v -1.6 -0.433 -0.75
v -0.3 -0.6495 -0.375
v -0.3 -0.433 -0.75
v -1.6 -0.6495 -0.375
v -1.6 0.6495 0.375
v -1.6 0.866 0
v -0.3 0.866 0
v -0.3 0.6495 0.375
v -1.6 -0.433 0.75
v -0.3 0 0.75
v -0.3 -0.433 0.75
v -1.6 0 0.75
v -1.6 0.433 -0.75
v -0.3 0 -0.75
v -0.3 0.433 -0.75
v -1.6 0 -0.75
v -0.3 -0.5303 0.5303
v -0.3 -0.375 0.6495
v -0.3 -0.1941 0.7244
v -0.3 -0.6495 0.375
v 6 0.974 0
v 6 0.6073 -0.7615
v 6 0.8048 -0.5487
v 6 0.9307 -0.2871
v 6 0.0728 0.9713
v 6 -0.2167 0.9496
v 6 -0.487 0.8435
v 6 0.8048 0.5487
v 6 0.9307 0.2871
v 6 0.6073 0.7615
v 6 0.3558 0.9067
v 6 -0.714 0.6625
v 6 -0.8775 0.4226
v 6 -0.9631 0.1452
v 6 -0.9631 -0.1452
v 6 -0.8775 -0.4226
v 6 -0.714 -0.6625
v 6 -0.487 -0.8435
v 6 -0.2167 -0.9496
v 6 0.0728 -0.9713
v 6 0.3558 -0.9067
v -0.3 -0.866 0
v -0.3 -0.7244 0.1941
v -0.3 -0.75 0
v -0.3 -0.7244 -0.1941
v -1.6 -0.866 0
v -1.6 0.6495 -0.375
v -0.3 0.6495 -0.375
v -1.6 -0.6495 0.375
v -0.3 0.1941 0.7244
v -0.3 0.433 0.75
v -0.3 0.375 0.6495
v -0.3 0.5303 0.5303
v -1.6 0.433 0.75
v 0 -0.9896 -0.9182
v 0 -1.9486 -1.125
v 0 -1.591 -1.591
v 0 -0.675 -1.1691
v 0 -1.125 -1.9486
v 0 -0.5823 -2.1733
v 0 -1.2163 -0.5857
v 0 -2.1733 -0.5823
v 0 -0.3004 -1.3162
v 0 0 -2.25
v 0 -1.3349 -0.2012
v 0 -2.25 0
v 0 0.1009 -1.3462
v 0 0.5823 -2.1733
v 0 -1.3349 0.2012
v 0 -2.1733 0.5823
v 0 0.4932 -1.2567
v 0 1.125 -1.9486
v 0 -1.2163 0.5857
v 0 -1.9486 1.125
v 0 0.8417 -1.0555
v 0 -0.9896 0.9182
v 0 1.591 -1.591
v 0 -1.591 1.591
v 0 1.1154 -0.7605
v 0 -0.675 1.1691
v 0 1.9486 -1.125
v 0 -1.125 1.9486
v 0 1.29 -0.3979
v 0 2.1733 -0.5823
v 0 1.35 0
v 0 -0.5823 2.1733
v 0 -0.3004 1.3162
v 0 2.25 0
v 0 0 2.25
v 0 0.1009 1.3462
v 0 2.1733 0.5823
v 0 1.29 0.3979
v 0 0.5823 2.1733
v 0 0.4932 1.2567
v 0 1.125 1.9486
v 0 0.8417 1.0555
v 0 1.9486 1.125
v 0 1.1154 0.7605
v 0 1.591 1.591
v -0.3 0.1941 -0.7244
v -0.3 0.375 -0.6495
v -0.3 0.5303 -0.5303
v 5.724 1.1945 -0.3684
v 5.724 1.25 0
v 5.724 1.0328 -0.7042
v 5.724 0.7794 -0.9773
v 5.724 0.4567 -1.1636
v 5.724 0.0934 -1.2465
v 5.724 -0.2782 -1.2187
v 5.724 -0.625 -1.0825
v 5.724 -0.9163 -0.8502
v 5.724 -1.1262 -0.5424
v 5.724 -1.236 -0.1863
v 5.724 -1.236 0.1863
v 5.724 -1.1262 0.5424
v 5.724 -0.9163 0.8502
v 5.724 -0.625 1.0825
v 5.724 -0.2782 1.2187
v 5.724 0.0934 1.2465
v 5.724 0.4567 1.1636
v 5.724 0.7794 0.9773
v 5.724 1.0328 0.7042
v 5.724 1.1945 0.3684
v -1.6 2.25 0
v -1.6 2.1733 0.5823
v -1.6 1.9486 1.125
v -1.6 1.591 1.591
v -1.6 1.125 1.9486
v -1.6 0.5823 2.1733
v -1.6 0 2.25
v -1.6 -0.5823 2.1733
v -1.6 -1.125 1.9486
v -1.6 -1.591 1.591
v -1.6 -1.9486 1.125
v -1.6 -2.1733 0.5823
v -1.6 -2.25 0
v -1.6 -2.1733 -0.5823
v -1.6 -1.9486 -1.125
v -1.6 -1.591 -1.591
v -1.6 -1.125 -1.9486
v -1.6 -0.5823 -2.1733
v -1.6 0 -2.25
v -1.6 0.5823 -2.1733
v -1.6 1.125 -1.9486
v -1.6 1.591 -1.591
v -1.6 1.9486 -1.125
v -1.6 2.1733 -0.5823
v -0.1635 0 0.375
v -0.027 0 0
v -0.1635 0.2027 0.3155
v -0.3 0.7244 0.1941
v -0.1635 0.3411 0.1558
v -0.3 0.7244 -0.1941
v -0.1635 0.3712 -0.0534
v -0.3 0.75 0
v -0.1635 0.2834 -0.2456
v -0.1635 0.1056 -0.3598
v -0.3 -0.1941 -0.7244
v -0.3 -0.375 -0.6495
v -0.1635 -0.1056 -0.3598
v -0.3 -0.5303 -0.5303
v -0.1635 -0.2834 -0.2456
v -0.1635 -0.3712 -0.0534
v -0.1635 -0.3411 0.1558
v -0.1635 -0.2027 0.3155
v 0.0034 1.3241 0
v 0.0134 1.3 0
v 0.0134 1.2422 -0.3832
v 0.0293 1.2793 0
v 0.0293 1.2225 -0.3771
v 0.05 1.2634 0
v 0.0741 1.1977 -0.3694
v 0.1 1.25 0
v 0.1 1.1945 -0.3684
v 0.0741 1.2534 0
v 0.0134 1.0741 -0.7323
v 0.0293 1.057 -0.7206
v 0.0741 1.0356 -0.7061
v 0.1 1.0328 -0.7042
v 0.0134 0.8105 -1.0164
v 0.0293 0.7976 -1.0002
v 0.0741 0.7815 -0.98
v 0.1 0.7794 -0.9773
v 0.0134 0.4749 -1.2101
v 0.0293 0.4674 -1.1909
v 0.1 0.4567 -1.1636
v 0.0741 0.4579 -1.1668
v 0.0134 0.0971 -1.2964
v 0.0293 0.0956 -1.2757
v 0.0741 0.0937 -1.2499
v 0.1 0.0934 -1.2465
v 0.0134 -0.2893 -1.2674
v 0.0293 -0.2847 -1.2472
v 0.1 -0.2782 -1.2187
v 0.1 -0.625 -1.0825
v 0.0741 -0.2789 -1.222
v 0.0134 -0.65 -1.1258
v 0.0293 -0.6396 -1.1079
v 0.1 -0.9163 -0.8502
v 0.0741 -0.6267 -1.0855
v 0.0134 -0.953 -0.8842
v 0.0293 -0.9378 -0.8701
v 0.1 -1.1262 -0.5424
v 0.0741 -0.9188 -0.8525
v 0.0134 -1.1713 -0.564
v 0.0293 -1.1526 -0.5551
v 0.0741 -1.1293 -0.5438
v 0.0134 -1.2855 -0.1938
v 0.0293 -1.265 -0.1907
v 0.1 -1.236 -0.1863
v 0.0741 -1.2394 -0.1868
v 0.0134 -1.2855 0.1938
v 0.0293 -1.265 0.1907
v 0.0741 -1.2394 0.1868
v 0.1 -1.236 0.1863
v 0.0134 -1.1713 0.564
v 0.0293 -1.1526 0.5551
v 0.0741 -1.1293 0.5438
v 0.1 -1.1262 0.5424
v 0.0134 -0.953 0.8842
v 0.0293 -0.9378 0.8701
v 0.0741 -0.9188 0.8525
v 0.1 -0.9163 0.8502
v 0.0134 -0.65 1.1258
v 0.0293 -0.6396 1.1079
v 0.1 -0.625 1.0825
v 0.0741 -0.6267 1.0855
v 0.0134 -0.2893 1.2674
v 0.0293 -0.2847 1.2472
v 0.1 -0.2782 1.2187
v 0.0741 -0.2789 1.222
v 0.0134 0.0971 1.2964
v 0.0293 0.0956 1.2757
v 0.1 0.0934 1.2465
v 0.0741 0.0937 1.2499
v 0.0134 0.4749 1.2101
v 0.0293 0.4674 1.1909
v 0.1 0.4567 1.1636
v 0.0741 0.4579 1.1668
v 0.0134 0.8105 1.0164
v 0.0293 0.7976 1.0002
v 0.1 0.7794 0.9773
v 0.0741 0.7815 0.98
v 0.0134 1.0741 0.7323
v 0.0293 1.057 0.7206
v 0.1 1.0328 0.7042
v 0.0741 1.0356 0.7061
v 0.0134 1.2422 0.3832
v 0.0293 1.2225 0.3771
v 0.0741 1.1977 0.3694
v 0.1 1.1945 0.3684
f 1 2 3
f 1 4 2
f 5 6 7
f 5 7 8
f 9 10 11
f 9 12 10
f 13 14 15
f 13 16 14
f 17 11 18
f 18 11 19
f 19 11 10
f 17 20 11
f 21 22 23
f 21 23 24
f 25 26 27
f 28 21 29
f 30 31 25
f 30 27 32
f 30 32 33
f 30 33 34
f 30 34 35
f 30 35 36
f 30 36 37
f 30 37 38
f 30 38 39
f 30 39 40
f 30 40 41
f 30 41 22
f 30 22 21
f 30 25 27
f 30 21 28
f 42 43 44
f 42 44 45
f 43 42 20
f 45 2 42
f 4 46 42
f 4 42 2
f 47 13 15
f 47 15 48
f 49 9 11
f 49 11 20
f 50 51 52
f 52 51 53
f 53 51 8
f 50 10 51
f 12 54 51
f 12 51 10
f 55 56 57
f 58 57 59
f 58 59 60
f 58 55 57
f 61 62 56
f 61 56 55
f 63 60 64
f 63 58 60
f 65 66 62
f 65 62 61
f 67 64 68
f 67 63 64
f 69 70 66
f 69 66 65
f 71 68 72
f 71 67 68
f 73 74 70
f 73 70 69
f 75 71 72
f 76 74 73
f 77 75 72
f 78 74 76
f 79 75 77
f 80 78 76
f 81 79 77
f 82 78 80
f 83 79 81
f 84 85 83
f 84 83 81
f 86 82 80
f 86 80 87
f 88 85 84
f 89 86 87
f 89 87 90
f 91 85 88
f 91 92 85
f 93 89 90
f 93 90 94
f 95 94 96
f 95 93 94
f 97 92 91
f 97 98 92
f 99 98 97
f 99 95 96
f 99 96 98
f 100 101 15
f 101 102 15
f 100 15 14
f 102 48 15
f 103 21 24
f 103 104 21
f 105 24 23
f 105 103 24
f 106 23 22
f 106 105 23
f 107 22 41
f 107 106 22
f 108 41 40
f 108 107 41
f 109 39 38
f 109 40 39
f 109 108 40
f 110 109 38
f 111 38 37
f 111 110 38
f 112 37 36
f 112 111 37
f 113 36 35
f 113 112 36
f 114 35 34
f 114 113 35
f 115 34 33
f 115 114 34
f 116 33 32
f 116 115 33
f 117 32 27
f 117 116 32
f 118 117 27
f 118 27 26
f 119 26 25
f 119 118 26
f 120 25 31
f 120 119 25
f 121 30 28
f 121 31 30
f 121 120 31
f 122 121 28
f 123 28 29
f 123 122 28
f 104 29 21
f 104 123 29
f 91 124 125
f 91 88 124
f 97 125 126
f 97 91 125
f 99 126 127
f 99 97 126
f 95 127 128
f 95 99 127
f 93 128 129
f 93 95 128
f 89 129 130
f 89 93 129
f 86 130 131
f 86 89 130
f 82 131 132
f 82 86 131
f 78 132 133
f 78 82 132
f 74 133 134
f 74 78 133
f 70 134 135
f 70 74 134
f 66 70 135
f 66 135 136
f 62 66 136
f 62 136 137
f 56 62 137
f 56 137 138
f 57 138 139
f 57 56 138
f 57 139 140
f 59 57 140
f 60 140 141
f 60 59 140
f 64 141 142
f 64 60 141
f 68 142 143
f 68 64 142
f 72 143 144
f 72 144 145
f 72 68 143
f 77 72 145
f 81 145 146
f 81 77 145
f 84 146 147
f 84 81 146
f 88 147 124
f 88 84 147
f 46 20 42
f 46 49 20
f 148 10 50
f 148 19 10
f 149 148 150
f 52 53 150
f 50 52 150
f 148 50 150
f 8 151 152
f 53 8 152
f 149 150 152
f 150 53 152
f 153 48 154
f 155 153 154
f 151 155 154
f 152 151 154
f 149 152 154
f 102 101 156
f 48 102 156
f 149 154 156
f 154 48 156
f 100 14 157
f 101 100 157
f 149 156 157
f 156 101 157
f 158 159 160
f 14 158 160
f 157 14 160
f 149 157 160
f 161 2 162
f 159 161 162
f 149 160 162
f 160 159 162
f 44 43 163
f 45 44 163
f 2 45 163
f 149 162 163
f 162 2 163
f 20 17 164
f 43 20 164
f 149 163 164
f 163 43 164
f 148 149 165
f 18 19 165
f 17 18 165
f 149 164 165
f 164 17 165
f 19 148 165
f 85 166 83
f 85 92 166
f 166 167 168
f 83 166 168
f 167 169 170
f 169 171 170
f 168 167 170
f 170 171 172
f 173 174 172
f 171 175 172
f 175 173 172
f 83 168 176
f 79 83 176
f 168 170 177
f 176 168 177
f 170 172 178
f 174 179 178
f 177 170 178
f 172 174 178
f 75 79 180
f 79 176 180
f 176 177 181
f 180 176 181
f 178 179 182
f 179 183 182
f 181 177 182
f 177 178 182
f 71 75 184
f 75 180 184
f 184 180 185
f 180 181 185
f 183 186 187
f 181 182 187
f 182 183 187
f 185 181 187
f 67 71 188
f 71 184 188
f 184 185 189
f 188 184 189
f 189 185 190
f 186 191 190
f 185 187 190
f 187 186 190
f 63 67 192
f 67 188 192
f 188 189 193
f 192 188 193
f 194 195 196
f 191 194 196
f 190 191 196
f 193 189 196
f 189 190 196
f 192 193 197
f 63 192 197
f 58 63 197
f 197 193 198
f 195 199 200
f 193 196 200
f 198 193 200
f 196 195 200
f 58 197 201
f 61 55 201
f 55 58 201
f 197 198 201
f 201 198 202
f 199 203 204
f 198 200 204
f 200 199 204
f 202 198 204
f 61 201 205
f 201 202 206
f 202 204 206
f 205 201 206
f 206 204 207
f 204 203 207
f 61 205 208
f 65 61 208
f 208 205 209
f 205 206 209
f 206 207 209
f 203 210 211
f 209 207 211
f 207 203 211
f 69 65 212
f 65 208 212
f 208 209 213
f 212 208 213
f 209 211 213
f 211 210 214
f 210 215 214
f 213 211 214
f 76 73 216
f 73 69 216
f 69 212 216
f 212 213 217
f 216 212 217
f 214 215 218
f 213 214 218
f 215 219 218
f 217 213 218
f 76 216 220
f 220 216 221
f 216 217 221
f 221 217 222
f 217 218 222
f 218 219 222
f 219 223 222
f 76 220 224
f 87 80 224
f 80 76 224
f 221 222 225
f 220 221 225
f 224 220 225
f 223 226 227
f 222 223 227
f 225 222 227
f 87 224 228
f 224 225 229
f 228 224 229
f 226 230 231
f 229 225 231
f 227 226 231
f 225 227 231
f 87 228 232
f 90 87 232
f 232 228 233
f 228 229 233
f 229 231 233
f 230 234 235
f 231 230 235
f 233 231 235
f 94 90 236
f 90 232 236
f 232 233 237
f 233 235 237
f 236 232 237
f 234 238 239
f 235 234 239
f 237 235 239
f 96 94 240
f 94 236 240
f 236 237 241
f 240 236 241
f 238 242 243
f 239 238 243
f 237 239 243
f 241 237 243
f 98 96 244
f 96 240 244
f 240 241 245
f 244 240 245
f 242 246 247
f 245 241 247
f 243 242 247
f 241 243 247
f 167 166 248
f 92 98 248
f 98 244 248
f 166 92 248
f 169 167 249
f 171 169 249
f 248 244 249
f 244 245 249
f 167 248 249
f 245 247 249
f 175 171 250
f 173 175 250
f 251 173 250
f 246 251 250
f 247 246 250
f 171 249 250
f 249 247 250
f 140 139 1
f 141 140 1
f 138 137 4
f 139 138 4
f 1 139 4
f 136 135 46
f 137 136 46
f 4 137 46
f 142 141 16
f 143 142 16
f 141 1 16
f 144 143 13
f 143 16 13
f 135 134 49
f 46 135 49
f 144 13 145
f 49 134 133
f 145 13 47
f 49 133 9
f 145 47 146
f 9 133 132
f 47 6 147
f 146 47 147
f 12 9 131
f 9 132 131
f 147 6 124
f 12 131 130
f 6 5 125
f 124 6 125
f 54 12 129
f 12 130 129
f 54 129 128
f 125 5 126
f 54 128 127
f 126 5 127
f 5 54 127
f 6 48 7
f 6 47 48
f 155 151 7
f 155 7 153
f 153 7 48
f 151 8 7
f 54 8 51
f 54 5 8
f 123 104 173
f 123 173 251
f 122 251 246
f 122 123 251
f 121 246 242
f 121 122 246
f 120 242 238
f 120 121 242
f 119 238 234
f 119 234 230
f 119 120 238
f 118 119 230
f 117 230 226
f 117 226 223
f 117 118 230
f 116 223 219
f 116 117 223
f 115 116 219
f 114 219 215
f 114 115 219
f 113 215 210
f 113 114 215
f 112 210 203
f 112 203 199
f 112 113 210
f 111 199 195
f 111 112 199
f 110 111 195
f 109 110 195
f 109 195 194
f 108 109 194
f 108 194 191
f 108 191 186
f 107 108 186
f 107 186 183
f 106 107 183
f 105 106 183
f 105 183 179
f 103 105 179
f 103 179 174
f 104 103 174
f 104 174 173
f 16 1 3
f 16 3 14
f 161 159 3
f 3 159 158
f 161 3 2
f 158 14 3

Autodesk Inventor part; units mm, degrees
sketch "Sketch_1" plane through (0, 0, 0) normal (0, 0, 1) x (1, 0, 0)
  line L0 (6, 0) -> (-1.6, 0)
  line L1 (-1.6, 0) -> (-1.6, 2.25)
  line L2 (-1.6, 2.25) -> (0, 2.25)
  line L3 (0, 2.25) -> (0, 1.35)
  arc A0 (0, 1.35) -> (0.1, 1.25) centre (0.1, 1.35) ccw
  line L4 (0.1, 1.25) -> (5.724, 1.25)
  line L5 (5.724, 1.25) -> (6, 0.974)
  line L6 (6, 0.974) -> (6, 0)
  line L7 (6, 0) -> (-1.6, 0)
revolve "Revolution1" add sketch "Sketch_1" angle 360 about axis through (6, 0, 0) along (1, 0, 0)
thread "Thread1" size "M2.5x0.45" class "6g" standard "ISO Metric profile" length 5.274
sketch "Sketch2" plane through (-1.6, 0, 0) normal (-1, 0, 0) x (0, 0, 1)
  point P0 (0, 0)
hole "Hole1" at (-1.6, 0, 0) direction (1, 0, 0) diameter 1.5 depth 1.3 tip angle 140
sketch "Sketch_3" plane through (-1.6, 0, 0) normal (1, 0, 0) x (0, 0, -1)
  line L0 (-0.75, -0.433) -> (0, -0.866)
  line L1 (0, -0.866) -> (0.75, -0.433)
  line L2 (0.75, -0.433) -> (0.75, 0.433)
  line L3 (0.75, 0.433) -> (0, 0.866)
  line L4 (0, 0.866) -> (-0.75, 0.433)
  line L5 (-0.75, 0.433) -> (-0.75, -0.433)
extrude "Extrusion1" cut sketch "Sketch_3" along normal blind 1.3
ref_plane "bolt_XY" through (0, 0, 0) normal (1, 0, 0) x (0, 0, -1)
ref_plane "bolt_YZ" through (0, 0, 0) normal (0, 0, -1) x (0, 1, 0)
ref_plane "bolt_ZX" through (0, 0, 0) normal (0, 1, 0) x (1, 0, 0)
ref_plane "bolt_to_nut_XY" through (6, 0, 0) normal (1, 0, 0) x (0, 0, -1)
ref_plane "bolt_to_nut_YZ" through (6, 0, 0) normal (0, 0, -1) x (0, 1, 0)
ref_plane "bolt_to_nut_ZX" through (6, 0, 0) normal (0, 1, 0) x (1, 0, 0)
properties part number "CBSST2_5-6"
